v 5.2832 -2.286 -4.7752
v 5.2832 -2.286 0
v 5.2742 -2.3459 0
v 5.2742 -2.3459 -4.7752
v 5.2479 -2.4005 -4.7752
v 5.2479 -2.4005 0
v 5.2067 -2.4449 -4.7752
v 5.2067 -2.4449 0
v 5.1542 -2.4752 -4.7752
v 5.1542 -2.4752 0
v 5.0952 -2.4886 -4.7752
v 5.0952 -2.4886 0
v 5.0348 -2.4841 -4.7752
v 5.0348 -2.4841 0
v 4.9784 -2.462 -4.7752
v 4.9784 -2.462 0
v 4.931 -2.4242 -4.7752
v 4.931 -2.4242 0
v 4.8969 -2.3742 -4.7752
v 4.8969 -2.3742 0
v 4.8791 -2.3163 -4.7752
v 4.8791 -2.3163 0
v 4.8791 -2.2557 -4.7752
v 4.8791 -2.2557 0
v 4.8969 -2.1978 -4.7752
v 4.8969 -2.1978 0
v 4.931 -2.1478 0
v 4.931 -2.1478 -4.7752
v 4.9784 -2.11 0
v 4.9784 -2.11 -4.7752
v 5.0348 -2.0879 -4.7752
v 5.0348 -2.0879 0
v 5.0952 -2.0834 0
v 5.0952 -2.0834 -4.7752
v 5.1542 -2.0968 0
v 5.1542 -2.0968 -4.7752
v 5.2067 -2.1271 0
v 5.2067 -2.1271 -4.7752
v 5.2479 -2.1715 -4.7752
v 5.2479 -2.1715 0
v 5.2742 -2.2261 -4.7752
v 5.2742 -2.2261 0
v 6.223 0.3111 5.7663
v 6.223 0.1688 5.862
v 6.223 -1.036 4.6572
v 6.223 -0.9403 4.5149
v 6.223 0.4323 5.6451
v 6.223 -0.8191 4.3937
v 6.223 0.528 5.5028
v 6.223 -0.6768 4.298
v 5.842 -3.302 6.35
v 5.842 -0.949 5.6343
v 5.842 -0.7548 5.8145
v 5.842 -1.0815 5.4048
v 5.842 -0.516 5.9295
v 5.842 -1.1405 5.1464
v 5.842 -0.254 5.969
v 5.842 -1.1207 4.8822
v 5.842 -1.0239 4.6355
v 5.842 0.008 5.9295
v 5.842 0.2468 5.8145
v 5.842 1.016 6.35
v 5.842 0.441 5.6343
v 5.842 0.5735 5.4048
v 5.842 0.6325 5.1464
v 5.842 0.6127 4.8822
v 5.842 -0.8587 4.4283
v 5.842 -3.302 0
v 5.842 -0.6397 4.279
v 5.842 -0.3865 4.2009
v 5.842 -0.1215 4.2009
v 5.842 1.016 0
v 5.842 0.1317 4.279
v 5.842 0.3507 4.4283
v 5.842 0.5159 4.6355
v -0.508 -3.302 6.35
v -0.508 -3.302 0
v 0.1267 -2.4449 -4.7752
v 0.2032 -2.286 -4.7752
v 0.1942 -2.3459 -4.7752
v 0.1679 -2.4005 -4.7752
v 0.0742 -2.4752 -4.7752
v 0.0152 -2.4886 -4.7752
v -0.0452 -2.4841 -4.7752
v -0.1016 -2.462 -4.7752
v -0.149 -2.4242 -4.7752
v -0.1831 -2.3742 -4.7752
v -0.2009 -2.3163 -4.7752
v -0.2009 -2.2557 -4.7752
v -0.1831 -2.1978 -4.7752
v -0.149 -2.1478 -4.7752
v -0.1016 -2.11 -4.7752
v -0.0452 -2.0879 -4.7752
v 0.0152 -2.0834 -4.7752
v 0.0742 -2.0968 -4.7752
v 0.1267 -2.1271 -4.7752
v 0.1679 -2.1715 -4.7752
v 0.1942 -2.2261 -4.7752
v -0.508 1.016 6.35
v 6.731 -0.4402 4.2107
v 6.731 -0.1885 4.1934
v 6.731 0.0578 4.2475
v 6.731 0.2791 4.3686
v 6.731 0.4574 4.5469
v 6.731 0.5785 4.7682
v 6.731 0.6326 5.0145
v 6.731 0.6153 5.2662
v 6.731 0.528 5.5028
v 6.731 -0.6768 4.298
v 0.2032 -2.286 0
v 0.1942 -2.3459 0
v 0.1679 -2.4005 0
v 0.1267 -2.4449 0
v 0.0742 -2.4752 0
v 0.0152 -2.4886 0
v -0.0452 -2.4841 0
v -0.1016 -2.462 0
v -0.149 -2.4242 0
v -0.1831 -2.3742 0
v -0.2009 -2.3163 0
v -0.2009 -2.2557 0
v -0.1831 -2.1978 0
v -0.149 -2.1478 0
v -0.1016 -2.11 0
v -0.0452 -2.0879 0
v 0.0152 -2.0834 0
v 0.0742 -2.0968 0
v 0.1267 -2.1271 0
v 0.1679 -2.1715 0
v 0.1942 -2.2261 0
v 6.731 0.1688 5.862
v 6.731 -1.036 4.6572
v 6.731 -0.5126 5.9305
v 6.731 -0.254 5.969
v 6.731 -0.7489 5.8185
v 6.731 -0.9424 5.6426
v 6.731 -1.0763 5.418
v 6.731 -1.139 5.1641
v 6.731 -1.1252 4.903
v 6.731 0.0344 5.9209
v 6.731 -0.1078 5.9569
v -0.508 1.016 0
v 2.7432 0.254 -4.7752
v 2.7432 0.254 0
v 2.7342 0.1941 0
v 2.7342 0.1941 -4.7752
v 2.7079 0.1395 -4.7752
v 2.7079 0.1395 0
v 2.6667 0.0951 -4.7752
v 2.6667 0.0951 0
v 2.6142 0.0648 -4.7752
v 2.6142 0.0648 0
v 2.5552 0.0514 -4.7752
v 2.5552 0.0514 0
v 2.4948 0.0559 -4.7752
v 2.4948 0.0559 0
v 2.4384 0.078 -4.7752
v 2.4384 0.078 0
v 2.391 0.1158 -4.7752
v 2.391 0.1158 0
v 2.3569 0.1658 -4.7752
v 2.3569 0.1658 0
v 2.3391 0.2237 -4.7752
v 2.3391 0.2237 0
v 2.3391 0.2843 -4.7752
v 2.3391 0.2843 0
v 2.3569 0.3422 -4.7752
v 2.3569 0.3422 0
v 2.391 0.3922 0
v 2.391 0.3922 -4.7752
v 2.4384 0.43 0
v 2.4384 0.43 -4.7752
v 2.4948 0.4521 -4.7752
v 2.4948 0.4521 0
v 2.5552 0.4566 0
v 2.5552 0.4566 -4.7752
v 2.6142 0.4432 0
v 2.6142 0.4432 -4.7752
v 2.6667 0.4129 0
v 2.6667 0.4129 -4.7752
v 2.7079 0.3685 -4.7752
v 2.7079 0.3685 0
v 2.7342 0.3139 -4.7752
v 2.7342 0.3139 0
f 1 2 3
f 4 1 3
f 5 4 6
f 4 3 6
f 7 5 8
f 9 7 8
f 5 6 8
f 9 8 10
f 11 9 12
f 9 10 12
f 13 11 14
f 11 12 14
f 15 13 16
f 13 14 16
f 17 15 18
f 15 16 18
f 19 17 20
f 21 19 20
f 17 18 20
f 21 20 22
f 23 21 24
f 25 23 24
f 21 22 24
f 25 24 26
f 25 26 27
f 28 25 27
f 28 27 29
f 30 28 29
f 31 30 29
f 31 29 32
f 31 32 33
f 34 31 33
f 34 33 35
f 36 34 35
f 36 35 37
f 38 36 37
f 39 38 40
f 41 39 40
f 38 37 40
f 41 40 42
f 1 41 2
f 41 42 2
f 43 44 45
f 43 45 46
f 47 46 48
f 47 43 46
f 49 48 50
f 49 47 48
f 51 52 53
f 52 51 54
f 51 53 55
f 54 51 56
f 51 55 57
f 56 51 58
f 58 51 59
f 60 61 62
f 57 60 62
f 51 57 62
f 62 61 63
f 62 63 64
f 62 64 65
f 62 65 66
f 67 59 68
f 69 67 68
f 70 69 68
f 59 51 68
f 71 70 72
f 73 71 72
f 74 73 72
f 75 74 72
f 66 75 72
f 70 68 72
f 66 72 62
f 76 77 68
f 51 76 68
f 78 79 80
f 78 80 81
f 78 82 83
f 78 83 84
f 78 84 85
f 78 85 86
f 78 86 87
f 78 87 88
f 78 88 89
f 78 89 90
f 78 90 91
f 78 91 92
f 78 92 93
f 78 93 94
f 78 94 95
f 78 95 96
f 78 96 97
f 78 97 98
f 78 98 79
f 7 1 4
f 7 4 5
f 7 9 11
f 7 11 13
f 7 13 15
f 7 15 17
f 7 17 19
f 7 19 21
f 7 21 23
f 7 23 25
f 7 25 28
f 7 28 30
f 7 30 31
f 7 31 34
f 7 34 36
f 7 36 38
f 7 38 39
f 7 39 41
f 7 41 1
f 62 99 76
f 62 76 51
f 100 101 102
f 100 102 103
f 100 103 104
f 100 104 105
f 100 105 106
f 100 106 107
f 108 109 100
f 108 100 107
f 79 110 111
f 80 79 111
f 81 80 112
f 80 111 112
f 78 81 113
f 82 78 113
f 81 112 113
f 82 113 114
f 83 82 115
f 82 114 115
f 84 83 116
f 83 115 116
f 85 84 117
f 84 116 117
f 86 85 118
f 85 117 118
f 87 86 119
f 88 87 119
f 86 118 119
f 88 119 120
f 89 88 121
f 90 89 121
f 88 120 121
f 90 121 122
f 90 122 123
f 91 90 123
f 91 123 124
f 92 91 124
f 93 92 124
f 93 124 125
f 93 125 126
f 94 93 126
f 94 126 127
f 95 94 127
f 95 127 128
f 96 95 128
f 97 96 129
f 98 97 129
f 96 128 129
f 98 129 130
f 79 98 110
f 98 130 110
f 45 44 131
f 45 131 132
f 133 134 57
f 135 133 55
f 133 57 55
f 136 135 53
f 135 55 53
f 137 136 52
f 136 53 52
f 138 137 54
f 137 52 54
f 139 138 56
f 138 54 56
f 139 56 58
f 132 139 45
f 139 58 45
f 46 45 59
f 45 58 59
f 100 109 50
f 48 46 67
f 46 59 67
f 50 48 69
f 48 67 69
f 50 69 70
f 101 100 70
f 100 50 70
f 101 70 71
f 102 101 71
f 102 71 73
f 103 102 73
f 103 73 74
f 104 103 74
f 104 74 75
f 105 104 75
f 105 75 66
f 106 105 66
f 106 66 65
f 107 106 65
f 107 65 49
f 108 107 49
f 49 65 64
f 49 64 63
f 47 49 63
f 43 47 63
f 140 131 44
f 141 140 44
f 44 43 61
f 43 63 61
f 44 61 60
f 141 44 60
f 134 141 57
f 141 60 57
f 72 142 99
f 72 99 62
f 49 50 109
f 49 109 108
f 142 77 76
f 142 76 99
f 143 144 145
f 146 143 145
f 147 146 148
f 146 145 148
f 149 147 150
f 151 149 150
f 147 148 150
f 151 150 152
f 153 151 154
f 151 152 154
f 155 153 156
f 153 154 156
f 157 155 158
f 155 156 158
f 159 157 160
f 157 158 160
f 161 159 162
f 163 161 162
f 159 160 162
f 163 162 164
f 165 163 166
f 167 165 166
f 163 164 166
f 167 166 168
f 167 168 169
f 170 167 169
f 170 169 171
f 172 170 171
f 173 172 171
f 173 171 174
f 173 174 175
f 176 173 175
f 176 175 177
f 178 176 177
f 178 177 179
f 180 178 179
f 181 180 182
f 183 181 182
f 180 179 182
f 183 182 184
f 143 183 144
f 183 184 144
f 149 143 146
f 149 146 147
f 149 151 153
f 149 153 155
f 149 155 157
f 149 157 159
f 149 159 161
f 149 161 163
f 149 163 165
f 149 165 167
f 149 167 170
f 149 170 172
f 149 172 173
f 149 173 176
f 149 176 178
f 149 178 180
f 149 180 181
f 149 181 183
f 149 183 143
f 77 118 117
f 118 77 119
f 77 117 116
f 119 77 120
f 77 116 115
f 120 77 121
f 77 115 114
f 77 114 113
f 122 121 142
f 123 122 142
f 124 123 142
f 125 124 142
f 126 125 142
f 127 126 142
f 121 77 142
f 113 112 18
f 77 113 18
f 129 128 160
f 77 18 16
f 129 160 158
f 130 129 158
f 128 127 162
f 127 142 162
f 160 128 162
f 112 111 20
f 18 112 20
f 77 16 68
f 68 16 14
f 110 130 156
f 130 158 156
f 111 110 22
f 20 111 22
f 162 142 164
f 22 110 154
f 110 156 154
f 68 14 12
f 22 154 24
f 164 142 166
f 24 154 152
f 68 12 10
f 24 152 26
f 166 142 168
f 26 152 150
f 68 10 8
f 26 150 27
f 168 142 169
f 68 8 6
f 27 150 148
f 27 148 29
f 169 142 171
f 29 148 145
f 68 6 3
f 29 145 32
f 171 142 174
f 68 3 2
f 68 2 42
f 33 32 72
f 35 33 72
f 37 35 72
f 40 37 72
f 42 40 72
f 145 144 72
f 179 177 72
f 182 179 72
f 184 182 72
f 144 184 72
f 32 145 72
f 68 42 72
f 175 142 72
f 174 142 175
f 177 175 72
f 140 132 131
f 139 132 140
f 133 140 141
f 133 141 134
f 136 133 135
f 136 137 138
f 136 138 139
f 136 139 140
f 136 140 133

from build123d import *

# Parameters (mm, degrees)
SKETCH2_W           = 6.35
SKETCH2_H           = 4.318
BOSS_EXTRUDE1_DEPTH = 6.35
SKETCH3_R           = 0.889
BOSS_EXTRUDE2_DEPTH = 0.889
CUT_EXTRUDE1_START  = -0.508
CUT_EXTRUDE1_DEPTH  = 0.508
SKETCH8_R           = 0.2032
BOSS_EXTRUDE3_DEPTH = 4.7752


with BuildPart() as part:
    # Sketch2 → Boss-Extrude1 (new body)
    with BuildSketch(Plane.XY):
        with Locations((2.667, -1.143)):
            Rectangle(SKETCH2_W, SKETCH2_H)
    extrude(amount=BOSS_EXTRUDE1_DEPTH)

    # Sketch3 → Boss-Extrude2 (add)
    with BuildSketch(Plane(origin=(5.842, 0, 0), x_dir=(0, 0, -1), z_dir=(1, 0, 0))):
        with Locations(Location((-5.08, -0.254, 0), (0, 0, 180))):
            Circle(SKETCH3_R)
    extrude(amount=BOSS_EXTRUDE2_DEPTH)

    # Sketch4 → Cut-Extrude1 (cut)
    with BuildSketch(Plane(origin=(6.731, 0, 0), x_dir=(0, 0, -1), z_dir=(1, 0, 0)).offset(CUT_EXTRUDE1_START)):
        with BuildLine():
            Line((-4.297980983, -0.676808772), (-5.502808772, 0.528019017))
            ThreePointArc((-5.502808772, 0.528019017), (-5.708617928, 0.374617928), (-5.862019017, 0.168808772))
            Line((-5.862019017, 0.168808772), (-4.657191228, -1.036019017))
            ThreePointArc((-4.657191228, -1.036019017), (-4.451382072, -0.882617928), (-4.297980983, -0.676808772))
        make_face()
    extrude(amount=CUT_EXTRUDE1_DEPTH, mode=Mode.SUBTRACT)

    # Sketch8 → Boss-Extrude3 (add)
    with BuildSketch(Plane(origin=(0, 0, 0), x_dir=(-1, 0, 0), z_dir=(0, 0, -1))):
        with Locations(Location((0, -2.286, 0), (0, 0, 180))):
            Circle(SKETCH8_R)
        with Locations(Location((-5.08, -2.286, 0), (0, 0, 180))):
            Circle(SKETCH8_R)
        with Locations(Location((-2.54, 0.254, 0), (0, 0, 180))):
            Circle(SKETCH8_R)
    extrude(amount=BOSS_EXTRUDE3_DEPTH)


solid = part.part
